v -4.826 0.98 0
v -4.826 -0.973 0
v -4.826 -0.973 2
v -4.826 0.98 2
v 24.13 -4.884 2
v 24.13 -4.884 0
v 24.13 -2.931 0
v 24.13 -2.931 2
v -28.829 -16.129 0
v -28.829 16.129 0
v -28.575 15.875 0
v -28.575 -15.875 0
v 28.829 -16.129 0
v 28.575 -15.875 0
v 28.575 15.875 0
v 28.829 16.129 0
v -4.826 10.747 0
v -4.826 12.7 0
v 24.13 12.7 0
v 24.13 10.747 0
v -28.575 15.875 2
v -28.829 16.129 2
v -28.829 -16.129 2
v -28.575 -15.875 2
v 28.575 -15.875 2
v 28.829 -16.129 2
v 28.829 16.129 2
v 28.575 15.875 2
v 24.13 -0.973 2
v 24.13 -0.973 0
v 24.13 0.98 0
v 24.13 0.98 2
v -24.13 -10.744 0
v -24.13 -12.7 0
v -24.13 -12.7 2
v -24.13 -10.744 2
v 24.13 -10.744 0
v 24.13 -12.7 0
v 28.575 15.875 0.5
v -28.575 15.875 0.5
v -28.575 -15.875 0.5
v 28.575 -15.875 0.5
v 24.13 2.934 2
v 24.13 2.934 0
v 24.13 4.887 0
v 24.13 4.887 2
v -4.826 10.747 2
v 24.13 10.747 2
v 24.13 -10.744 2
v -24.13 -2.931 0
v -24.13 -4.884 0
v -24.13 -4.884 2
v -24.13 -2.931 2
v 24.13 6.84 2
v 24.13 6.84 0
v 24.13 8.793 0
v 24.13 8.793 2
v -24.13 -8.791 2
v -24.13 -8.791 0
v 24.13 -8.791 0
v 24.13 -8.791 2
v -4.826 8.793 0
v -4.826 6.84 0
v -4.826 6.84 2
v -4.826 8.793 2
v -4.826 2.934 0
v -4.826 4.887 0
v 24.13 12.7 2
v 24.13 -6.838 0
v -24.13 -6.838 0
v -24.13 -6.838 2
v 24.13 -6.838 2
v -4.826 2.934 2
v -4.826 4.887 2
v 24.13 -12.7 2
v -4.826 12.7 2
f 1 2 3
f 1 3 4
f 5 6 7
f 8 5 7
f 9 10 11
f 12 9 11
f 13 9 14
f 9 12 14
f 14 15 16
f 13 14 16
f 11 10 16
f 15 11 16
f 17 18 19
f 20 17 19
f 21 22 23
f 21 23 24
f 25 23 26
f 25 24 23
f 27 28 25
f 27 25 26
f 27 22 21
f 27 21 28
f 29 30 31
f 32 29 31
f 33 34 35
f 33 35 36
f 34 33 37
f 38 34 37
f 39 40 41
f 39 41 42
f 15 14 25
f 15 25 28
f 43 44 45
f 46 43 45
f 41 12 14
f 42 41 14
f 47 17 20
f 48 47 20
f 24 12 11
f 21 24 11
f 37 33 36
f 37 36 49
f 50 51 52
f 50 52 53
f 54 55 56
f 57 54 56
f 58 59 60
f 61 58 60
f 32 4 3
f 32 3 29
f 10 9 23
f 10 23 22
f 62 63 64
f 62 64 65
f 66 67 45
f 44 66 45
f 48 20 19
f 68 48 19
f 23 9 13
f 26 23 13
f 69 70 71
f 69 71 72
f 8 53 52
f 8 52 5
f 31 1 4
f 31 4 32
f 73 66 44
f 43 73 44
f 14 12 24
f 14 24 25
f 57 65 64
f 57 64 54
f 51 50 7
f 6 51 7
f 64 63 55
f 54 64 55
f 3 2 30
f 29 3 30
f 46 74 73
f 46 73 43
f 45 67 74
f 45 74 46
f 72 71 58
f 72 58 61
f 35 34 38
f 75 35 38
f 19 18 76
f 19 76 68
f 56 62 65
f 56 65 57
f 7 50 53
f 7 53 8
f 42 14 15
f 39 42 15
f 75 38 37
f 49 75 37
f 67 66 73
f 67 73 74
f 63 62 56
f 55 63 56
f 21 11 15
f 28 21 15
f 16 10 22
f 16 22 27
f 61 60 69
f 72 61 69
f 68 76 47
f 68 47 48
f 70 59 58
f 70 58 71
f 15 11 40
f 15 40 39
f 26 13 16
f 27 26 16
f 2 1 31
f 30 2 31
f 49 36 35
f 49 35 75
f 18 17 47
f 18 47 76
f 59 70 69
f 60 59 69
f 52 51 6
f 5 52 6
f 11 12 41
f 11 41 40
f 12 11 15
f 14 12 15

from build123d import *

# Parameters (mm, degrees)
F0_W     = 28.956
F0_H     = 1.95326
F0_W_2   = 48.26
F0_H_2   = 1.9558
F1_DEPTH = 2
F2_W     = 57.658
F2_H     = 32.258
F2_W_2   = 57.15
F2_H_2   = 31.75
F3_DEPTH = 2
F4_W     = 57.15
F4_H     = 31.75
F5_DEPTH = 0.5


with BuildPart() as f1:
    # F0 (on Top) → F1 (new body)
    with BuildSketch(Plane.XY):
        with Locations((9.652, 11.72337)):
            Rectangle(F0_W, F0_H)
        with Locations((9.652, 7.81685)):
            Rectangle(F0_W, F0_H)
        with Locations((9.652, 3.91033)):
            Rectangle(F0_W, F0_H)
        with Locations((9.652, 0.00381)):
            Rectangle(F0_W, F0_H)
        with Locations((0, -3.90779)):
            Rectangle(F0_W_2, F0_H)
        with Locations((0, -7.81431)):
            Rectangle(F0_W_2, F0_H)
        with Locations((0, -11.7221)):
            Rectangle(F0_W_2, F0_H_2)
    extrude(amount=F1_DEPTH)


with BuildPart() as f3:
    # F2 (on Top) → F3 (new body)
    with BuildSketch(Plane.XY):
        Rectangle(F2_W, F2_H)
        Rectangle(F2_W_2, F2_H_2, mode=Mode.SUBTRACT)
    extrude(amount=F3_DEPTH)


with BuildPart() as f5:
    # F4 (on Top) → F5 (new body)
    with BuildSketch(Plane.XY):
        Rectangle(F4_W, F4_H)
    extrude(amount=F5_DEPTH)


solid = Compound([f1.part, f3.part, f5.part])
